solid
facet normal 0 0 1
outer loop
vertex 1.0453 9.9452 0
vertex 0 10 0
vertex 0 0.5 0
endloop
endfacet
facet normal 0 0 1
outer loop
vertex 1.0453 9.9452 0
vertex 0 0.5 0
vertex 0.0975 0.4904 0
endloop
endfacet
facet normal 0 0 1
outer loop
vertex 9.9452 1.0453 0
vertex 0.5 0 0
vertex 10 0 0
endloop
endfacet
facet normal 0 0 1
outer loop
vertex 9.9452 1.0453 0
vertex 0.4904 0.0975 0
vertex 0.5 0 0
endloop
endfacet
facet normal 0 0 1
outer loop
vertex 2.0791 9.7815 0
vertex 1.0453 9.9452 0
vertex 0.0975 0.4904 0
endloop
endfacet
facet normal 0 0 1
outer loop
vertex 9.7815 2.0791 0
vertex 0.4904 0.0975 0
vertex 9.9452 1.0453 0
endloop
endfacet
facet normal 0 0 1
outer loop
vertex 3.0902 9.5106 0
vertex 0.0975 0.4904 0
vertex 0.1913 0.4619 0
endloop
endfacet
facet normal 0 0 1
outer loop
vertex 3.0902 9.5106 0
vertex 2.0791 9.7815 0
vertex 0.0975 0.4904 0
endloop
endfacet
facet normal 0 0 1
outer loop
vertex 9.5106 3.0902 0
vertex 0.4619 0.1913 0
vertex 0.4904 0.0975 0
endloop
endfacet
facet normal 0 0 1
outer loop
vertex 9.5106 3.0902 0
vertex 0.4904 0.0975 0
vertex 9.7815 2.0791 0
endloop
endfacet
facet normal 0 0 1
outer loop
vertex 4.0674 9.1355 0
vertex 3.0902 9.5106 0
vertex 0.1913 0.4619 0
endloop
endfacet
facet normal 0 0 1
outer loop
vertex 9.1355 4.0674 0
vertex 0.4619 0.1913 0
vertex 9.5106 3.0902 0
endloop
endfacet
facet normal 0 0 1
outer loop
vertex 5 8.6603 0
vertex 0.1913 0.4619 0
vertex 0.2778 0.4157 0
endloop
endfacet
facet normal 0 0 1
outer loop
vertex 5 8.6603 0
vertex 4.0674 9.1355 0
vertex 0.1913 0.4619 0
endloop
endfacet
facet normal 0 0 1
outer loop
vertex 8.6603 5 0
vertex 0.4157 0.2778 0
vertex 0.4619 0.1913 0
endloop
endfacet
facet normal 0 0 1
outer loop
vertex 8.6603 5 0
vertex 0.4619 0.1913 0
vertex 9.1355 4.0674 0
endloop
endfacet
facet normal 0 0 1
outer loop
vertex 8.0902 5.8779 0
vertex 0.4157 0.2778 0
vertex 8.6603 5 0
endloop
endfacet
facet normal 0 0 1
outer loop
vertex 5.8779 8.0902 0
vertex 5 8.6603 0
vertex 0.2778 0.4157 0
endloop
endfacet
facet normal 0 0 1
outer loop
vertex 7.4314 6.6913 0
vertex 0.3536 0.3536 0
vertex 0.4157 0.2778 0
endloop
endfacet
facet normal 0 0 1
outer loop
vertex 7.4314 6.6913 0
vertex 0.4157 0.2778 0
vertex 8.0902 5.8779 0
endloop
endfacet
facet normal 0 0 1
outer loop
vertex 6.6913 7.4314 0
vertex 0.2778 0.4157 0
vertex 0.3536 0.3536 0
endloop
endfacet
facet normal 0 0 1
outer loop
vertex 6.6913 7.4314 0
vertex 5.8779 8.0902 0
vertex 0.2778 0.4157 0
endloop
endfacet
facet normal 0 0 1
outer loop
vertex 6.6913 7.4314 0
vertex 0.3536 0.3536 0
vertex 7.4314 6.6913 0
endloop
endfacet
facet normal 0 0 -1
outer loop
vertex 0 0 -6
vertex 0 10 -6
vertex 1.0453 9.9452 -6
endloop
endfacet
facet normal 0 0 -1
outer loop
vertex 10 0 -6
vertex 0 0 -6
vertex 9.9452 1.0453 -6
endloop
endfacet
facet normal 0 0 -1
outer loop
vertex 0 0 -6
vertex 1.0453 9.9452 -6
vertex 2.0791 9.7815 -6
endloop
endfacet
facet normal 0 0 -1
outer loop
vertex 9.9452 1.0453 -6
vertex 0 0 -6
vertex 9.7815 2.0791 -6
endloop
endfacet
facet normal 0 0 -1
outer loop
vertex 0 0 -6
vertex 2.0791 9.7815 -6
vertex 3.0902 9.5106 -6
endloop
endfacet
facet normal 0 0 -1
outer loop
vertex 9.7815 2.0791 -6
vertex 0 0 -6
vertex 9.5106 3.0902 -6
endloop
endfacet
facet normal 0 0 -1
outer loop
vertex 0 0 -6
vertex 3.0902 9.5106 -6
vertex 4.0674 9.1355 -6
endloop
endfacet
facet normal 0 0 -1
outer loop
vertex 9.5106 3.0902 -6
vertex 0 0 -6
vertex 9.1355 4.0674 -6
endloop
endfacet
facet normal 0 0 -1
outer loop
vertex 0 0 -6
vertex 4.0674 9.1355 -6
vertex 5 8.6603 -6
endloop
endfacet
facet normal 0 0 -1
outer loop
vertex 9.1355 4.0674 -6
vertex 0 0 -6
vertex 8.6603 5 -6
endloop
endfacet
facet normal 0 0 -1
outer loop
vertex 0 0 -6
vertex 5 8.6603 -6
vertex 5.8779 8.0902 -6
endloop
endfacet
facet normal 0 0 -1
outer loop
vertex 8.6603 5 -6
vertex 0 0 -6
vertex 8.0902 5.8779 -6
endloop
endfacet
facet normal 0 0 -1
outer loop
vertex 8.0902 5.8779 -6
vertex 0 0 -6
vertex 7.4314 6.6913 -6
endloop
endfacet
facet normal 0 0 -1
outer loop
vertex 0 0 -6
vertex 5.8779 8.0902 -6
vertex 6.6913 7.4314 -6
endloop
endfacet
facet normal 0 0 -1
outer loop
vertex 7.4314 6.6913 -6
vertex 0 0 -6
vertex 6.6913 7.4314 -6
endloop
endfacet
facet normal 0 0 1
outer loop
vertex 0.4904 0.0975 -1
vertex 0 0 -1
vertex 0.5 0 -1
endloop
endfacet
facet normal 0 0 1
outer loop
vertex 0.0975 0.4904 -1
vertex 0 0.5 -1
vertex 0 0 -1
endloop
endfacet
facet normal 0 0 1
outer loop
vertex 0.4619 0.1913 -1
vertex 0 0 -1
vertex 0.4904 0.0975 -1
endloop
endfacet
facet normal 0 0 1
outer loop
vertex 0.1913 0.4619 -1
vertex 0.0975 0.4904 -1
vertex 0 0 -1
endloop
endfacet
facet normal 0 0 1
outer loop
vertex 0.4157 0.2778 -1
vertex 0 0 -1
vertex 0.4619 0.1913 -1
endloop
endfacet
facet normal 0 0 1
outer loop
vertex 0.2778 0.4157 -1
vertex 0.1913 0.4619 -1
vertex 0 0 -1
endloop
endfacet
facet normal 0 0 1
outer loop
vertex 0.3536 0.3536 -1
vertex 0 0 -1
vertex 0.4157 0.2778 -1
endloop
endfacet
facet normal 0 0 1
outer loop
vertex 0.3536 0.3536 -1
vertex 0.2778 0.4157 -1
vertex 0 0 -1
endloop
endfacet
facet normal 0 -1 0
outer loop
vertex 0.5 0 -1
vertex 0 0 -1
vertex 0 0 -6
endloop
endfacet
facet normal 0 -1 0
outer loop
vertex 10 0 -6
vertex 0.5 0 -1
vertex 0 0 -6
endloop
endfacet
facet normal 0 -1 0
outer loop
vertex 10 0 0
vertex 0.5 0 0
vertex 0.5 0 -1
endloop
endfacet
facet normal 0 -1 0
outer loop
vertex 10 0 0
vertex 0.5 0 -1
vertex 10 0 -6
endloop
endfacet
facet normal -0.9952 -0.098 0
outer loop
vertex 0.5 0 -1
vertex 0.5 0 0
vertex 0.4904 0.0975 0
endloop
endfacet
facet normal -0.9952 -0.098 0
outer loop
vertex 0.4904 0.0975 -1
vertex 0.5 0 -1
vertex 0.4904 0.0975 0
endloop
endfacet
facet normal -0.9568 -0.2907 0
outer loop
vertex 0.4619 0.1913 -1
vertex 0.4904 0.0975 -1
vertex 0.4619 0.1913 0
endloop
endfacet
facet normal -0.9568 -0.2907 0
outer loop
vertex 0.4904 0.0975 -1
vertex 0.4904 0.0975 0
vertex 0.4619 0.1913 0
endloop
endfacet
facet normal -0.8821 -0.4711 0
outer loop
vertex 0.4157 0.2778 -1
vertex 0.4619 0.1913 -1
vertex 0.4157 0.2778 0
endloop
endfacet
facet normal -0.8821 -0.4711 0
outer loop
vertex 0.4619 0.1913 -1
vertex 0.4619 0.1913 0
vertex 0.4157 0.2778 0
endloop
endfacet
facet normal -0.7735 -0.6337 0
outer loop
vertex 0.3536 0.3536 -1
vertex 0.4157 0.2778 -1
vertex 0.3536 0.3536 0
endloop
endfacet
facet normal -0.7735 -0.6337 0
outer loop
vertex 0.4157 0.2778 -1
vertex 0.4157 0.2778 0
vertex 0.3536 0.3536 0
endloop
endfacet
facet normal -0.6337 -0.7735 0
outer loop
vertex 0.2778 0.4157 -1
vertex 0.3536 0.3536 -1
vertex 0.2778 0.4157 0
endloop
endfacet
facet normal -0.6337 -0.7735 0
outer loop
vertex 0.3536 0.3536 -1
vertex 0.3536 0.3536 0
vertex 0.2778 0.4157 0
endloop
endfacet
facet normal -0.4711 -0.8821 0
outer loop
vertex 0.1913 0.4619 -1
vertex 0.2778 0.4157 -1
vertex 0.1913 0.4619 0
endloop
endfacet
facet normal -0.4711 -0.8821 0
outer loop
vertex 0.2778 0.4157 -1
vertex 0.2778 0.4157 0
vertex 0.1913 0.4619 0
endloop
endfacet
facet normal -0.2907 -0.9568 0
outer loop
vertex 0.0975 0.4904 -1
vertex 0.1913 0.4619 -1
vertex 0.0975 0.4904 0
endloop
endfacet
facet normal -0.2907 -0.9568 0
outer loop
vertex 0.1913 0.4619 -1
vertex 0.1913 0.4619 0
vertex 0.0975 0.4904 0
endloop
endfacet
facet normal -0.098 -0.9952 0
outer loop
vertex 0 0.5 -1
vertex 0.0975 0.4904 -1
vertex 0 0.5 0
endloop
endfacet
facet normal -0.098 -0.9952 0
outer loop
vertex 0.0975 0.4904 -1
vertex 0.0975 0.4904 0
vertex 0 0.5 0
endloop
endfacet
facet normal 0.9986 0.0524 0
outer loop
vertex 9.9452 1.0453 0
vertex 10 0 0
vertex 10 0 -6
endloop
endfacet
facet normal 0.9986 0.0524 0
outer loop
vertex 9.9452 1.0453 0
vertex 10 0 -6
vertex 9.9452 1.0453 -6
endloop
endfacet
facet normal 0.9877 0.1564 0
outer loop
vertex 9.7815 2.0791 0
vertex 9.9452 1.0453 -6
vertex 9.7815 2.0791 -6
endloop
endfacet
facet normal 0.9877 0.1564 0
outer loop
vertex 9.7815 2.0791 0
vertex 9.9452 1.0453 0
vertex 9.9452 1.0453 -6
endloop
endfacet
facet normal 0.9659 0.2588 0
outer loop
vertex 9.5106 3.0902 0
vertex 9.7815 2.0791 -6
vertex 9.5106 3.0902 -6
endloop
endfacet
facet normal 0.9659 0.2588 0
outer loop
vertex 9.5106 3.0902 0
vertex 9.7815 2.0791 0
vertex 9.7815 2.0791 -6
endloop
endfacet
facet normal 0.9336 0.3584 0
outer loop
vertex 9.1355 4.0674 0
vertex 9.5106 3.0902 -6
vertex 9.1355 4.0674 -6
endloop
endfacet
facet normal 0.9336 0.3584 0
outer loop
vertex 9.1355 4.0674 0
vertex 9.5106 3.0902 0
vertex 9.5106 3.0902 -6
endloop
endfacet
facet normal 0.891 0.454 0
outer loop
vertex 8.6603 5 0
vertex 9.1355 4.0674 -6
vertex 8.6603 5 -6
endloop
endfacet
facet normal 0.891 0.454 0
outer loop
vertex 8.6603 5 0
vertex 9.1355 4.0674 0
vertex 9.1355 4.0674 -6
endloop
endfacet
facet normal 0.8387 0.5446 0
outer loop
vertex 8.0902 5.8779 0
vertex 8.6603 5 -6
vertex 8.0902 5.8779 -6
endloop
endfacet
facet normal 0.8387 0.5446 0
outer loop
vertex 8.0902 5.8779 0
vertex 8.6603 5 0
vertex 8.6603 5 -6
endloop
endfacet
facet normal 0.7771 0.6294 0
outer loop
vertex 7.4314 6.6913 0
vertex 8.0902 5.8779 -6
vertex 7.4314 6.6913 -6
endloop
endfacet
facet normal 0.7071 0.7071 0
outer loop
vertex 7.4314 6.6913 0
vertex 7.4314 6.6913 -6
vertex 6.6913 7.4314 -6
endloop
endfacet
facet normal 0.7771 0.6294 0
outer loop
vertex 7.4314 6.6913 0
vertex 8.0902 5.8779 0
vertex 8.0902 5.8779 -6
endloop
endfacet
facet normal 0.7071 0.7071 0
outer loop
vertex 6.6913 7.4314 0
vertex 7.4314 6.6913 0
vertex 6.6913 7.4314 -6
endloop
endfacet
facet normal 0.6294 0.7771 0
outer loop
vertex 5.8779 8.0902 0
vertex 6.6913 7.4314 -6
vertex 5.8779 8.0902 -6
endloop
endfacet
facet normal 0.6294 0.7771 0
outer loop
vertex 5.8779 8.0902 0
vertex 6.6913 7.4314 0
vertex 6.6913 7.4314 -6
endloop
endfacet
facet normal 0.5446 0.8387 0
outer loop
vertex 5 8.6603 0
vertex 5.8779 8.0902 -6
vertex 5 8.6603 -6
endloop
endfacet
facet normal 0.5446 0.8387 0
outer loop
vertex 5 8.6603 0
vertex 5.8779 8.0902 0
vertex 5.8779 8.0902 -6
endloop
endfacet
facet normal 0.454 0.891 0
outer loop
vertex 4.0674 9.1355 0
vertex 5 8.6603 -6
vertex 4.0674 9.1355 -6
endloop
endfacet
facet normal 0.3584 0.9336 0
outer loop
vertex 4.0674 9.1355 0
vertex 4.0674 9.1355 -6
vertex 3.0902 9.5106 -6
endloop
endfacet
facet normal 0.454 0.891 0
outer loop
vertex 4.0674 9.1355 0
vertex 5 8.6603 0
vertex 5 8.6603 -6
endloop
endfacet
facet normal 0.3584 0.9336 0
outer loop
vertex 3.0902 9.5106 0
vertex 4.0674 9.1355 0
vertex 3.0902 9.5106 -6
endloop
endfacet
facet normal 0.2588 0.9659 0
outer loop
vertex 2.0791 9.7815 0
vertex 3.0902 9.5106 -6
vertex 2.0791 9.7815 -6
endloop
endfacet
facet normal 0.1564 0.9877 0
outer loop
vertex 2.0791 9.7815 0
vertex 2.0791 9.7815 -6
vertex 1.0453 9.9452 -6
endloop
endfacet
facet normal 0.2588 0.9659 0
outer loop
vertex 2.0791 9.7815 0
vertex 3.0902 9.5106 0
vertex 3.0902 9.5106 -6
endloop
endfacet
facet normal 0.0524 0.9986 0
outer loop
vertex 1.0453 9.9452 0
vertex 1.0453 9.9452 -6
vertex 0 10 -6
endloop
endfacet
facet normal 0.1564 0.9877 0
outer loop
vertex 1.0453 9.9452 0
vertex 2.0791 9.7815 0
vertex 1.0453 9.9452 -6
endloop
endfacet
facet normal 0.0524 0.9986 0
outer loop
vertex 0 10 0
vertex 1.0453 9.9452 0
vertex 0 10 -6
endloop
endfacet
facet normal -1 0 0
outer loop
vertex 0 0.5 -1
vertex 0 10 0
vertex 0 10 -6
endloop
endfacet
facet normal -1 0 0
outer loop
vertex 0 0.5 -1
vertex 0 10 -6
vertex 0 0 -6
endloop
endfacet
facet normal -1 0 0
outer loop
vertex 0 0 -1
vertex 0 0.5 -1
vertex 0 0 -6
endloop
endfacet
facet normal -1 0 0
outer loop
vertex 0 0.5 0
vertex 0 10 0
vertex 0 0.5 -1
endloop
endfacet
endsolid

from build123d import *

# Parameters (mm, degrees)
F3_DEPTH = 6
F4_DEPTH = 1


# Not quite as in the source:
# - a feature of the source that left no trace in its solid (it failed there, or was rolled back) is left out


with BuildPart() as f3:
    # F0 (on Top) → F3 (new body)
    with BuildSketch(Plane.XY):
        with BuildLine():
            ThreePointArc((0, 1.25), (0.8838834765, 0.8838834765), (1.25, 0))
            Line((1.25, 0), (10, 0))
            ThreePointArc((10, 0), (7.0710678119, 7.0710678119), (0, 10))
            Line((0, 10), (0, 1.25))
        make_face()
        with BuildLine():
            ThreePointArc((0, 0.5), (0.3535533906, 0.3535533906), (0.5, 0))
            Line((0.5, 0), (1.25, 0))
            ThreePointArc((1.25, 0), (0.8838834765, 0.8838834765), (0, 1.25))
            Line((0, 1.25), (0, 0.5))
        make_face()
        with BuildLine():
            Line((0, 0), (0.5, 0))
            ThreePointArc((0.5, 0), (0.3535533906, 0.3535533906), (0, 0.5))
            Line((0, 0.5), (0, 0))
        make_face()
    extrude(amount=-F3_DEPTH)

    # F0 (on Top) → F4 (cut)
    with BuildSketch(Plane.XY):
        with BuildLine():
            Line((0, 0), (0.5, 0))
            ThreePointArc((0.5, 0), (0.3535533906, 0.3535533906), (0, 0.5))
            Line((0, 0.5), (0, 0))
        make_face()
    extrude(amount=-F4_DEPTH, mode=Mode.SUBTRACT)


solid = f3.part
